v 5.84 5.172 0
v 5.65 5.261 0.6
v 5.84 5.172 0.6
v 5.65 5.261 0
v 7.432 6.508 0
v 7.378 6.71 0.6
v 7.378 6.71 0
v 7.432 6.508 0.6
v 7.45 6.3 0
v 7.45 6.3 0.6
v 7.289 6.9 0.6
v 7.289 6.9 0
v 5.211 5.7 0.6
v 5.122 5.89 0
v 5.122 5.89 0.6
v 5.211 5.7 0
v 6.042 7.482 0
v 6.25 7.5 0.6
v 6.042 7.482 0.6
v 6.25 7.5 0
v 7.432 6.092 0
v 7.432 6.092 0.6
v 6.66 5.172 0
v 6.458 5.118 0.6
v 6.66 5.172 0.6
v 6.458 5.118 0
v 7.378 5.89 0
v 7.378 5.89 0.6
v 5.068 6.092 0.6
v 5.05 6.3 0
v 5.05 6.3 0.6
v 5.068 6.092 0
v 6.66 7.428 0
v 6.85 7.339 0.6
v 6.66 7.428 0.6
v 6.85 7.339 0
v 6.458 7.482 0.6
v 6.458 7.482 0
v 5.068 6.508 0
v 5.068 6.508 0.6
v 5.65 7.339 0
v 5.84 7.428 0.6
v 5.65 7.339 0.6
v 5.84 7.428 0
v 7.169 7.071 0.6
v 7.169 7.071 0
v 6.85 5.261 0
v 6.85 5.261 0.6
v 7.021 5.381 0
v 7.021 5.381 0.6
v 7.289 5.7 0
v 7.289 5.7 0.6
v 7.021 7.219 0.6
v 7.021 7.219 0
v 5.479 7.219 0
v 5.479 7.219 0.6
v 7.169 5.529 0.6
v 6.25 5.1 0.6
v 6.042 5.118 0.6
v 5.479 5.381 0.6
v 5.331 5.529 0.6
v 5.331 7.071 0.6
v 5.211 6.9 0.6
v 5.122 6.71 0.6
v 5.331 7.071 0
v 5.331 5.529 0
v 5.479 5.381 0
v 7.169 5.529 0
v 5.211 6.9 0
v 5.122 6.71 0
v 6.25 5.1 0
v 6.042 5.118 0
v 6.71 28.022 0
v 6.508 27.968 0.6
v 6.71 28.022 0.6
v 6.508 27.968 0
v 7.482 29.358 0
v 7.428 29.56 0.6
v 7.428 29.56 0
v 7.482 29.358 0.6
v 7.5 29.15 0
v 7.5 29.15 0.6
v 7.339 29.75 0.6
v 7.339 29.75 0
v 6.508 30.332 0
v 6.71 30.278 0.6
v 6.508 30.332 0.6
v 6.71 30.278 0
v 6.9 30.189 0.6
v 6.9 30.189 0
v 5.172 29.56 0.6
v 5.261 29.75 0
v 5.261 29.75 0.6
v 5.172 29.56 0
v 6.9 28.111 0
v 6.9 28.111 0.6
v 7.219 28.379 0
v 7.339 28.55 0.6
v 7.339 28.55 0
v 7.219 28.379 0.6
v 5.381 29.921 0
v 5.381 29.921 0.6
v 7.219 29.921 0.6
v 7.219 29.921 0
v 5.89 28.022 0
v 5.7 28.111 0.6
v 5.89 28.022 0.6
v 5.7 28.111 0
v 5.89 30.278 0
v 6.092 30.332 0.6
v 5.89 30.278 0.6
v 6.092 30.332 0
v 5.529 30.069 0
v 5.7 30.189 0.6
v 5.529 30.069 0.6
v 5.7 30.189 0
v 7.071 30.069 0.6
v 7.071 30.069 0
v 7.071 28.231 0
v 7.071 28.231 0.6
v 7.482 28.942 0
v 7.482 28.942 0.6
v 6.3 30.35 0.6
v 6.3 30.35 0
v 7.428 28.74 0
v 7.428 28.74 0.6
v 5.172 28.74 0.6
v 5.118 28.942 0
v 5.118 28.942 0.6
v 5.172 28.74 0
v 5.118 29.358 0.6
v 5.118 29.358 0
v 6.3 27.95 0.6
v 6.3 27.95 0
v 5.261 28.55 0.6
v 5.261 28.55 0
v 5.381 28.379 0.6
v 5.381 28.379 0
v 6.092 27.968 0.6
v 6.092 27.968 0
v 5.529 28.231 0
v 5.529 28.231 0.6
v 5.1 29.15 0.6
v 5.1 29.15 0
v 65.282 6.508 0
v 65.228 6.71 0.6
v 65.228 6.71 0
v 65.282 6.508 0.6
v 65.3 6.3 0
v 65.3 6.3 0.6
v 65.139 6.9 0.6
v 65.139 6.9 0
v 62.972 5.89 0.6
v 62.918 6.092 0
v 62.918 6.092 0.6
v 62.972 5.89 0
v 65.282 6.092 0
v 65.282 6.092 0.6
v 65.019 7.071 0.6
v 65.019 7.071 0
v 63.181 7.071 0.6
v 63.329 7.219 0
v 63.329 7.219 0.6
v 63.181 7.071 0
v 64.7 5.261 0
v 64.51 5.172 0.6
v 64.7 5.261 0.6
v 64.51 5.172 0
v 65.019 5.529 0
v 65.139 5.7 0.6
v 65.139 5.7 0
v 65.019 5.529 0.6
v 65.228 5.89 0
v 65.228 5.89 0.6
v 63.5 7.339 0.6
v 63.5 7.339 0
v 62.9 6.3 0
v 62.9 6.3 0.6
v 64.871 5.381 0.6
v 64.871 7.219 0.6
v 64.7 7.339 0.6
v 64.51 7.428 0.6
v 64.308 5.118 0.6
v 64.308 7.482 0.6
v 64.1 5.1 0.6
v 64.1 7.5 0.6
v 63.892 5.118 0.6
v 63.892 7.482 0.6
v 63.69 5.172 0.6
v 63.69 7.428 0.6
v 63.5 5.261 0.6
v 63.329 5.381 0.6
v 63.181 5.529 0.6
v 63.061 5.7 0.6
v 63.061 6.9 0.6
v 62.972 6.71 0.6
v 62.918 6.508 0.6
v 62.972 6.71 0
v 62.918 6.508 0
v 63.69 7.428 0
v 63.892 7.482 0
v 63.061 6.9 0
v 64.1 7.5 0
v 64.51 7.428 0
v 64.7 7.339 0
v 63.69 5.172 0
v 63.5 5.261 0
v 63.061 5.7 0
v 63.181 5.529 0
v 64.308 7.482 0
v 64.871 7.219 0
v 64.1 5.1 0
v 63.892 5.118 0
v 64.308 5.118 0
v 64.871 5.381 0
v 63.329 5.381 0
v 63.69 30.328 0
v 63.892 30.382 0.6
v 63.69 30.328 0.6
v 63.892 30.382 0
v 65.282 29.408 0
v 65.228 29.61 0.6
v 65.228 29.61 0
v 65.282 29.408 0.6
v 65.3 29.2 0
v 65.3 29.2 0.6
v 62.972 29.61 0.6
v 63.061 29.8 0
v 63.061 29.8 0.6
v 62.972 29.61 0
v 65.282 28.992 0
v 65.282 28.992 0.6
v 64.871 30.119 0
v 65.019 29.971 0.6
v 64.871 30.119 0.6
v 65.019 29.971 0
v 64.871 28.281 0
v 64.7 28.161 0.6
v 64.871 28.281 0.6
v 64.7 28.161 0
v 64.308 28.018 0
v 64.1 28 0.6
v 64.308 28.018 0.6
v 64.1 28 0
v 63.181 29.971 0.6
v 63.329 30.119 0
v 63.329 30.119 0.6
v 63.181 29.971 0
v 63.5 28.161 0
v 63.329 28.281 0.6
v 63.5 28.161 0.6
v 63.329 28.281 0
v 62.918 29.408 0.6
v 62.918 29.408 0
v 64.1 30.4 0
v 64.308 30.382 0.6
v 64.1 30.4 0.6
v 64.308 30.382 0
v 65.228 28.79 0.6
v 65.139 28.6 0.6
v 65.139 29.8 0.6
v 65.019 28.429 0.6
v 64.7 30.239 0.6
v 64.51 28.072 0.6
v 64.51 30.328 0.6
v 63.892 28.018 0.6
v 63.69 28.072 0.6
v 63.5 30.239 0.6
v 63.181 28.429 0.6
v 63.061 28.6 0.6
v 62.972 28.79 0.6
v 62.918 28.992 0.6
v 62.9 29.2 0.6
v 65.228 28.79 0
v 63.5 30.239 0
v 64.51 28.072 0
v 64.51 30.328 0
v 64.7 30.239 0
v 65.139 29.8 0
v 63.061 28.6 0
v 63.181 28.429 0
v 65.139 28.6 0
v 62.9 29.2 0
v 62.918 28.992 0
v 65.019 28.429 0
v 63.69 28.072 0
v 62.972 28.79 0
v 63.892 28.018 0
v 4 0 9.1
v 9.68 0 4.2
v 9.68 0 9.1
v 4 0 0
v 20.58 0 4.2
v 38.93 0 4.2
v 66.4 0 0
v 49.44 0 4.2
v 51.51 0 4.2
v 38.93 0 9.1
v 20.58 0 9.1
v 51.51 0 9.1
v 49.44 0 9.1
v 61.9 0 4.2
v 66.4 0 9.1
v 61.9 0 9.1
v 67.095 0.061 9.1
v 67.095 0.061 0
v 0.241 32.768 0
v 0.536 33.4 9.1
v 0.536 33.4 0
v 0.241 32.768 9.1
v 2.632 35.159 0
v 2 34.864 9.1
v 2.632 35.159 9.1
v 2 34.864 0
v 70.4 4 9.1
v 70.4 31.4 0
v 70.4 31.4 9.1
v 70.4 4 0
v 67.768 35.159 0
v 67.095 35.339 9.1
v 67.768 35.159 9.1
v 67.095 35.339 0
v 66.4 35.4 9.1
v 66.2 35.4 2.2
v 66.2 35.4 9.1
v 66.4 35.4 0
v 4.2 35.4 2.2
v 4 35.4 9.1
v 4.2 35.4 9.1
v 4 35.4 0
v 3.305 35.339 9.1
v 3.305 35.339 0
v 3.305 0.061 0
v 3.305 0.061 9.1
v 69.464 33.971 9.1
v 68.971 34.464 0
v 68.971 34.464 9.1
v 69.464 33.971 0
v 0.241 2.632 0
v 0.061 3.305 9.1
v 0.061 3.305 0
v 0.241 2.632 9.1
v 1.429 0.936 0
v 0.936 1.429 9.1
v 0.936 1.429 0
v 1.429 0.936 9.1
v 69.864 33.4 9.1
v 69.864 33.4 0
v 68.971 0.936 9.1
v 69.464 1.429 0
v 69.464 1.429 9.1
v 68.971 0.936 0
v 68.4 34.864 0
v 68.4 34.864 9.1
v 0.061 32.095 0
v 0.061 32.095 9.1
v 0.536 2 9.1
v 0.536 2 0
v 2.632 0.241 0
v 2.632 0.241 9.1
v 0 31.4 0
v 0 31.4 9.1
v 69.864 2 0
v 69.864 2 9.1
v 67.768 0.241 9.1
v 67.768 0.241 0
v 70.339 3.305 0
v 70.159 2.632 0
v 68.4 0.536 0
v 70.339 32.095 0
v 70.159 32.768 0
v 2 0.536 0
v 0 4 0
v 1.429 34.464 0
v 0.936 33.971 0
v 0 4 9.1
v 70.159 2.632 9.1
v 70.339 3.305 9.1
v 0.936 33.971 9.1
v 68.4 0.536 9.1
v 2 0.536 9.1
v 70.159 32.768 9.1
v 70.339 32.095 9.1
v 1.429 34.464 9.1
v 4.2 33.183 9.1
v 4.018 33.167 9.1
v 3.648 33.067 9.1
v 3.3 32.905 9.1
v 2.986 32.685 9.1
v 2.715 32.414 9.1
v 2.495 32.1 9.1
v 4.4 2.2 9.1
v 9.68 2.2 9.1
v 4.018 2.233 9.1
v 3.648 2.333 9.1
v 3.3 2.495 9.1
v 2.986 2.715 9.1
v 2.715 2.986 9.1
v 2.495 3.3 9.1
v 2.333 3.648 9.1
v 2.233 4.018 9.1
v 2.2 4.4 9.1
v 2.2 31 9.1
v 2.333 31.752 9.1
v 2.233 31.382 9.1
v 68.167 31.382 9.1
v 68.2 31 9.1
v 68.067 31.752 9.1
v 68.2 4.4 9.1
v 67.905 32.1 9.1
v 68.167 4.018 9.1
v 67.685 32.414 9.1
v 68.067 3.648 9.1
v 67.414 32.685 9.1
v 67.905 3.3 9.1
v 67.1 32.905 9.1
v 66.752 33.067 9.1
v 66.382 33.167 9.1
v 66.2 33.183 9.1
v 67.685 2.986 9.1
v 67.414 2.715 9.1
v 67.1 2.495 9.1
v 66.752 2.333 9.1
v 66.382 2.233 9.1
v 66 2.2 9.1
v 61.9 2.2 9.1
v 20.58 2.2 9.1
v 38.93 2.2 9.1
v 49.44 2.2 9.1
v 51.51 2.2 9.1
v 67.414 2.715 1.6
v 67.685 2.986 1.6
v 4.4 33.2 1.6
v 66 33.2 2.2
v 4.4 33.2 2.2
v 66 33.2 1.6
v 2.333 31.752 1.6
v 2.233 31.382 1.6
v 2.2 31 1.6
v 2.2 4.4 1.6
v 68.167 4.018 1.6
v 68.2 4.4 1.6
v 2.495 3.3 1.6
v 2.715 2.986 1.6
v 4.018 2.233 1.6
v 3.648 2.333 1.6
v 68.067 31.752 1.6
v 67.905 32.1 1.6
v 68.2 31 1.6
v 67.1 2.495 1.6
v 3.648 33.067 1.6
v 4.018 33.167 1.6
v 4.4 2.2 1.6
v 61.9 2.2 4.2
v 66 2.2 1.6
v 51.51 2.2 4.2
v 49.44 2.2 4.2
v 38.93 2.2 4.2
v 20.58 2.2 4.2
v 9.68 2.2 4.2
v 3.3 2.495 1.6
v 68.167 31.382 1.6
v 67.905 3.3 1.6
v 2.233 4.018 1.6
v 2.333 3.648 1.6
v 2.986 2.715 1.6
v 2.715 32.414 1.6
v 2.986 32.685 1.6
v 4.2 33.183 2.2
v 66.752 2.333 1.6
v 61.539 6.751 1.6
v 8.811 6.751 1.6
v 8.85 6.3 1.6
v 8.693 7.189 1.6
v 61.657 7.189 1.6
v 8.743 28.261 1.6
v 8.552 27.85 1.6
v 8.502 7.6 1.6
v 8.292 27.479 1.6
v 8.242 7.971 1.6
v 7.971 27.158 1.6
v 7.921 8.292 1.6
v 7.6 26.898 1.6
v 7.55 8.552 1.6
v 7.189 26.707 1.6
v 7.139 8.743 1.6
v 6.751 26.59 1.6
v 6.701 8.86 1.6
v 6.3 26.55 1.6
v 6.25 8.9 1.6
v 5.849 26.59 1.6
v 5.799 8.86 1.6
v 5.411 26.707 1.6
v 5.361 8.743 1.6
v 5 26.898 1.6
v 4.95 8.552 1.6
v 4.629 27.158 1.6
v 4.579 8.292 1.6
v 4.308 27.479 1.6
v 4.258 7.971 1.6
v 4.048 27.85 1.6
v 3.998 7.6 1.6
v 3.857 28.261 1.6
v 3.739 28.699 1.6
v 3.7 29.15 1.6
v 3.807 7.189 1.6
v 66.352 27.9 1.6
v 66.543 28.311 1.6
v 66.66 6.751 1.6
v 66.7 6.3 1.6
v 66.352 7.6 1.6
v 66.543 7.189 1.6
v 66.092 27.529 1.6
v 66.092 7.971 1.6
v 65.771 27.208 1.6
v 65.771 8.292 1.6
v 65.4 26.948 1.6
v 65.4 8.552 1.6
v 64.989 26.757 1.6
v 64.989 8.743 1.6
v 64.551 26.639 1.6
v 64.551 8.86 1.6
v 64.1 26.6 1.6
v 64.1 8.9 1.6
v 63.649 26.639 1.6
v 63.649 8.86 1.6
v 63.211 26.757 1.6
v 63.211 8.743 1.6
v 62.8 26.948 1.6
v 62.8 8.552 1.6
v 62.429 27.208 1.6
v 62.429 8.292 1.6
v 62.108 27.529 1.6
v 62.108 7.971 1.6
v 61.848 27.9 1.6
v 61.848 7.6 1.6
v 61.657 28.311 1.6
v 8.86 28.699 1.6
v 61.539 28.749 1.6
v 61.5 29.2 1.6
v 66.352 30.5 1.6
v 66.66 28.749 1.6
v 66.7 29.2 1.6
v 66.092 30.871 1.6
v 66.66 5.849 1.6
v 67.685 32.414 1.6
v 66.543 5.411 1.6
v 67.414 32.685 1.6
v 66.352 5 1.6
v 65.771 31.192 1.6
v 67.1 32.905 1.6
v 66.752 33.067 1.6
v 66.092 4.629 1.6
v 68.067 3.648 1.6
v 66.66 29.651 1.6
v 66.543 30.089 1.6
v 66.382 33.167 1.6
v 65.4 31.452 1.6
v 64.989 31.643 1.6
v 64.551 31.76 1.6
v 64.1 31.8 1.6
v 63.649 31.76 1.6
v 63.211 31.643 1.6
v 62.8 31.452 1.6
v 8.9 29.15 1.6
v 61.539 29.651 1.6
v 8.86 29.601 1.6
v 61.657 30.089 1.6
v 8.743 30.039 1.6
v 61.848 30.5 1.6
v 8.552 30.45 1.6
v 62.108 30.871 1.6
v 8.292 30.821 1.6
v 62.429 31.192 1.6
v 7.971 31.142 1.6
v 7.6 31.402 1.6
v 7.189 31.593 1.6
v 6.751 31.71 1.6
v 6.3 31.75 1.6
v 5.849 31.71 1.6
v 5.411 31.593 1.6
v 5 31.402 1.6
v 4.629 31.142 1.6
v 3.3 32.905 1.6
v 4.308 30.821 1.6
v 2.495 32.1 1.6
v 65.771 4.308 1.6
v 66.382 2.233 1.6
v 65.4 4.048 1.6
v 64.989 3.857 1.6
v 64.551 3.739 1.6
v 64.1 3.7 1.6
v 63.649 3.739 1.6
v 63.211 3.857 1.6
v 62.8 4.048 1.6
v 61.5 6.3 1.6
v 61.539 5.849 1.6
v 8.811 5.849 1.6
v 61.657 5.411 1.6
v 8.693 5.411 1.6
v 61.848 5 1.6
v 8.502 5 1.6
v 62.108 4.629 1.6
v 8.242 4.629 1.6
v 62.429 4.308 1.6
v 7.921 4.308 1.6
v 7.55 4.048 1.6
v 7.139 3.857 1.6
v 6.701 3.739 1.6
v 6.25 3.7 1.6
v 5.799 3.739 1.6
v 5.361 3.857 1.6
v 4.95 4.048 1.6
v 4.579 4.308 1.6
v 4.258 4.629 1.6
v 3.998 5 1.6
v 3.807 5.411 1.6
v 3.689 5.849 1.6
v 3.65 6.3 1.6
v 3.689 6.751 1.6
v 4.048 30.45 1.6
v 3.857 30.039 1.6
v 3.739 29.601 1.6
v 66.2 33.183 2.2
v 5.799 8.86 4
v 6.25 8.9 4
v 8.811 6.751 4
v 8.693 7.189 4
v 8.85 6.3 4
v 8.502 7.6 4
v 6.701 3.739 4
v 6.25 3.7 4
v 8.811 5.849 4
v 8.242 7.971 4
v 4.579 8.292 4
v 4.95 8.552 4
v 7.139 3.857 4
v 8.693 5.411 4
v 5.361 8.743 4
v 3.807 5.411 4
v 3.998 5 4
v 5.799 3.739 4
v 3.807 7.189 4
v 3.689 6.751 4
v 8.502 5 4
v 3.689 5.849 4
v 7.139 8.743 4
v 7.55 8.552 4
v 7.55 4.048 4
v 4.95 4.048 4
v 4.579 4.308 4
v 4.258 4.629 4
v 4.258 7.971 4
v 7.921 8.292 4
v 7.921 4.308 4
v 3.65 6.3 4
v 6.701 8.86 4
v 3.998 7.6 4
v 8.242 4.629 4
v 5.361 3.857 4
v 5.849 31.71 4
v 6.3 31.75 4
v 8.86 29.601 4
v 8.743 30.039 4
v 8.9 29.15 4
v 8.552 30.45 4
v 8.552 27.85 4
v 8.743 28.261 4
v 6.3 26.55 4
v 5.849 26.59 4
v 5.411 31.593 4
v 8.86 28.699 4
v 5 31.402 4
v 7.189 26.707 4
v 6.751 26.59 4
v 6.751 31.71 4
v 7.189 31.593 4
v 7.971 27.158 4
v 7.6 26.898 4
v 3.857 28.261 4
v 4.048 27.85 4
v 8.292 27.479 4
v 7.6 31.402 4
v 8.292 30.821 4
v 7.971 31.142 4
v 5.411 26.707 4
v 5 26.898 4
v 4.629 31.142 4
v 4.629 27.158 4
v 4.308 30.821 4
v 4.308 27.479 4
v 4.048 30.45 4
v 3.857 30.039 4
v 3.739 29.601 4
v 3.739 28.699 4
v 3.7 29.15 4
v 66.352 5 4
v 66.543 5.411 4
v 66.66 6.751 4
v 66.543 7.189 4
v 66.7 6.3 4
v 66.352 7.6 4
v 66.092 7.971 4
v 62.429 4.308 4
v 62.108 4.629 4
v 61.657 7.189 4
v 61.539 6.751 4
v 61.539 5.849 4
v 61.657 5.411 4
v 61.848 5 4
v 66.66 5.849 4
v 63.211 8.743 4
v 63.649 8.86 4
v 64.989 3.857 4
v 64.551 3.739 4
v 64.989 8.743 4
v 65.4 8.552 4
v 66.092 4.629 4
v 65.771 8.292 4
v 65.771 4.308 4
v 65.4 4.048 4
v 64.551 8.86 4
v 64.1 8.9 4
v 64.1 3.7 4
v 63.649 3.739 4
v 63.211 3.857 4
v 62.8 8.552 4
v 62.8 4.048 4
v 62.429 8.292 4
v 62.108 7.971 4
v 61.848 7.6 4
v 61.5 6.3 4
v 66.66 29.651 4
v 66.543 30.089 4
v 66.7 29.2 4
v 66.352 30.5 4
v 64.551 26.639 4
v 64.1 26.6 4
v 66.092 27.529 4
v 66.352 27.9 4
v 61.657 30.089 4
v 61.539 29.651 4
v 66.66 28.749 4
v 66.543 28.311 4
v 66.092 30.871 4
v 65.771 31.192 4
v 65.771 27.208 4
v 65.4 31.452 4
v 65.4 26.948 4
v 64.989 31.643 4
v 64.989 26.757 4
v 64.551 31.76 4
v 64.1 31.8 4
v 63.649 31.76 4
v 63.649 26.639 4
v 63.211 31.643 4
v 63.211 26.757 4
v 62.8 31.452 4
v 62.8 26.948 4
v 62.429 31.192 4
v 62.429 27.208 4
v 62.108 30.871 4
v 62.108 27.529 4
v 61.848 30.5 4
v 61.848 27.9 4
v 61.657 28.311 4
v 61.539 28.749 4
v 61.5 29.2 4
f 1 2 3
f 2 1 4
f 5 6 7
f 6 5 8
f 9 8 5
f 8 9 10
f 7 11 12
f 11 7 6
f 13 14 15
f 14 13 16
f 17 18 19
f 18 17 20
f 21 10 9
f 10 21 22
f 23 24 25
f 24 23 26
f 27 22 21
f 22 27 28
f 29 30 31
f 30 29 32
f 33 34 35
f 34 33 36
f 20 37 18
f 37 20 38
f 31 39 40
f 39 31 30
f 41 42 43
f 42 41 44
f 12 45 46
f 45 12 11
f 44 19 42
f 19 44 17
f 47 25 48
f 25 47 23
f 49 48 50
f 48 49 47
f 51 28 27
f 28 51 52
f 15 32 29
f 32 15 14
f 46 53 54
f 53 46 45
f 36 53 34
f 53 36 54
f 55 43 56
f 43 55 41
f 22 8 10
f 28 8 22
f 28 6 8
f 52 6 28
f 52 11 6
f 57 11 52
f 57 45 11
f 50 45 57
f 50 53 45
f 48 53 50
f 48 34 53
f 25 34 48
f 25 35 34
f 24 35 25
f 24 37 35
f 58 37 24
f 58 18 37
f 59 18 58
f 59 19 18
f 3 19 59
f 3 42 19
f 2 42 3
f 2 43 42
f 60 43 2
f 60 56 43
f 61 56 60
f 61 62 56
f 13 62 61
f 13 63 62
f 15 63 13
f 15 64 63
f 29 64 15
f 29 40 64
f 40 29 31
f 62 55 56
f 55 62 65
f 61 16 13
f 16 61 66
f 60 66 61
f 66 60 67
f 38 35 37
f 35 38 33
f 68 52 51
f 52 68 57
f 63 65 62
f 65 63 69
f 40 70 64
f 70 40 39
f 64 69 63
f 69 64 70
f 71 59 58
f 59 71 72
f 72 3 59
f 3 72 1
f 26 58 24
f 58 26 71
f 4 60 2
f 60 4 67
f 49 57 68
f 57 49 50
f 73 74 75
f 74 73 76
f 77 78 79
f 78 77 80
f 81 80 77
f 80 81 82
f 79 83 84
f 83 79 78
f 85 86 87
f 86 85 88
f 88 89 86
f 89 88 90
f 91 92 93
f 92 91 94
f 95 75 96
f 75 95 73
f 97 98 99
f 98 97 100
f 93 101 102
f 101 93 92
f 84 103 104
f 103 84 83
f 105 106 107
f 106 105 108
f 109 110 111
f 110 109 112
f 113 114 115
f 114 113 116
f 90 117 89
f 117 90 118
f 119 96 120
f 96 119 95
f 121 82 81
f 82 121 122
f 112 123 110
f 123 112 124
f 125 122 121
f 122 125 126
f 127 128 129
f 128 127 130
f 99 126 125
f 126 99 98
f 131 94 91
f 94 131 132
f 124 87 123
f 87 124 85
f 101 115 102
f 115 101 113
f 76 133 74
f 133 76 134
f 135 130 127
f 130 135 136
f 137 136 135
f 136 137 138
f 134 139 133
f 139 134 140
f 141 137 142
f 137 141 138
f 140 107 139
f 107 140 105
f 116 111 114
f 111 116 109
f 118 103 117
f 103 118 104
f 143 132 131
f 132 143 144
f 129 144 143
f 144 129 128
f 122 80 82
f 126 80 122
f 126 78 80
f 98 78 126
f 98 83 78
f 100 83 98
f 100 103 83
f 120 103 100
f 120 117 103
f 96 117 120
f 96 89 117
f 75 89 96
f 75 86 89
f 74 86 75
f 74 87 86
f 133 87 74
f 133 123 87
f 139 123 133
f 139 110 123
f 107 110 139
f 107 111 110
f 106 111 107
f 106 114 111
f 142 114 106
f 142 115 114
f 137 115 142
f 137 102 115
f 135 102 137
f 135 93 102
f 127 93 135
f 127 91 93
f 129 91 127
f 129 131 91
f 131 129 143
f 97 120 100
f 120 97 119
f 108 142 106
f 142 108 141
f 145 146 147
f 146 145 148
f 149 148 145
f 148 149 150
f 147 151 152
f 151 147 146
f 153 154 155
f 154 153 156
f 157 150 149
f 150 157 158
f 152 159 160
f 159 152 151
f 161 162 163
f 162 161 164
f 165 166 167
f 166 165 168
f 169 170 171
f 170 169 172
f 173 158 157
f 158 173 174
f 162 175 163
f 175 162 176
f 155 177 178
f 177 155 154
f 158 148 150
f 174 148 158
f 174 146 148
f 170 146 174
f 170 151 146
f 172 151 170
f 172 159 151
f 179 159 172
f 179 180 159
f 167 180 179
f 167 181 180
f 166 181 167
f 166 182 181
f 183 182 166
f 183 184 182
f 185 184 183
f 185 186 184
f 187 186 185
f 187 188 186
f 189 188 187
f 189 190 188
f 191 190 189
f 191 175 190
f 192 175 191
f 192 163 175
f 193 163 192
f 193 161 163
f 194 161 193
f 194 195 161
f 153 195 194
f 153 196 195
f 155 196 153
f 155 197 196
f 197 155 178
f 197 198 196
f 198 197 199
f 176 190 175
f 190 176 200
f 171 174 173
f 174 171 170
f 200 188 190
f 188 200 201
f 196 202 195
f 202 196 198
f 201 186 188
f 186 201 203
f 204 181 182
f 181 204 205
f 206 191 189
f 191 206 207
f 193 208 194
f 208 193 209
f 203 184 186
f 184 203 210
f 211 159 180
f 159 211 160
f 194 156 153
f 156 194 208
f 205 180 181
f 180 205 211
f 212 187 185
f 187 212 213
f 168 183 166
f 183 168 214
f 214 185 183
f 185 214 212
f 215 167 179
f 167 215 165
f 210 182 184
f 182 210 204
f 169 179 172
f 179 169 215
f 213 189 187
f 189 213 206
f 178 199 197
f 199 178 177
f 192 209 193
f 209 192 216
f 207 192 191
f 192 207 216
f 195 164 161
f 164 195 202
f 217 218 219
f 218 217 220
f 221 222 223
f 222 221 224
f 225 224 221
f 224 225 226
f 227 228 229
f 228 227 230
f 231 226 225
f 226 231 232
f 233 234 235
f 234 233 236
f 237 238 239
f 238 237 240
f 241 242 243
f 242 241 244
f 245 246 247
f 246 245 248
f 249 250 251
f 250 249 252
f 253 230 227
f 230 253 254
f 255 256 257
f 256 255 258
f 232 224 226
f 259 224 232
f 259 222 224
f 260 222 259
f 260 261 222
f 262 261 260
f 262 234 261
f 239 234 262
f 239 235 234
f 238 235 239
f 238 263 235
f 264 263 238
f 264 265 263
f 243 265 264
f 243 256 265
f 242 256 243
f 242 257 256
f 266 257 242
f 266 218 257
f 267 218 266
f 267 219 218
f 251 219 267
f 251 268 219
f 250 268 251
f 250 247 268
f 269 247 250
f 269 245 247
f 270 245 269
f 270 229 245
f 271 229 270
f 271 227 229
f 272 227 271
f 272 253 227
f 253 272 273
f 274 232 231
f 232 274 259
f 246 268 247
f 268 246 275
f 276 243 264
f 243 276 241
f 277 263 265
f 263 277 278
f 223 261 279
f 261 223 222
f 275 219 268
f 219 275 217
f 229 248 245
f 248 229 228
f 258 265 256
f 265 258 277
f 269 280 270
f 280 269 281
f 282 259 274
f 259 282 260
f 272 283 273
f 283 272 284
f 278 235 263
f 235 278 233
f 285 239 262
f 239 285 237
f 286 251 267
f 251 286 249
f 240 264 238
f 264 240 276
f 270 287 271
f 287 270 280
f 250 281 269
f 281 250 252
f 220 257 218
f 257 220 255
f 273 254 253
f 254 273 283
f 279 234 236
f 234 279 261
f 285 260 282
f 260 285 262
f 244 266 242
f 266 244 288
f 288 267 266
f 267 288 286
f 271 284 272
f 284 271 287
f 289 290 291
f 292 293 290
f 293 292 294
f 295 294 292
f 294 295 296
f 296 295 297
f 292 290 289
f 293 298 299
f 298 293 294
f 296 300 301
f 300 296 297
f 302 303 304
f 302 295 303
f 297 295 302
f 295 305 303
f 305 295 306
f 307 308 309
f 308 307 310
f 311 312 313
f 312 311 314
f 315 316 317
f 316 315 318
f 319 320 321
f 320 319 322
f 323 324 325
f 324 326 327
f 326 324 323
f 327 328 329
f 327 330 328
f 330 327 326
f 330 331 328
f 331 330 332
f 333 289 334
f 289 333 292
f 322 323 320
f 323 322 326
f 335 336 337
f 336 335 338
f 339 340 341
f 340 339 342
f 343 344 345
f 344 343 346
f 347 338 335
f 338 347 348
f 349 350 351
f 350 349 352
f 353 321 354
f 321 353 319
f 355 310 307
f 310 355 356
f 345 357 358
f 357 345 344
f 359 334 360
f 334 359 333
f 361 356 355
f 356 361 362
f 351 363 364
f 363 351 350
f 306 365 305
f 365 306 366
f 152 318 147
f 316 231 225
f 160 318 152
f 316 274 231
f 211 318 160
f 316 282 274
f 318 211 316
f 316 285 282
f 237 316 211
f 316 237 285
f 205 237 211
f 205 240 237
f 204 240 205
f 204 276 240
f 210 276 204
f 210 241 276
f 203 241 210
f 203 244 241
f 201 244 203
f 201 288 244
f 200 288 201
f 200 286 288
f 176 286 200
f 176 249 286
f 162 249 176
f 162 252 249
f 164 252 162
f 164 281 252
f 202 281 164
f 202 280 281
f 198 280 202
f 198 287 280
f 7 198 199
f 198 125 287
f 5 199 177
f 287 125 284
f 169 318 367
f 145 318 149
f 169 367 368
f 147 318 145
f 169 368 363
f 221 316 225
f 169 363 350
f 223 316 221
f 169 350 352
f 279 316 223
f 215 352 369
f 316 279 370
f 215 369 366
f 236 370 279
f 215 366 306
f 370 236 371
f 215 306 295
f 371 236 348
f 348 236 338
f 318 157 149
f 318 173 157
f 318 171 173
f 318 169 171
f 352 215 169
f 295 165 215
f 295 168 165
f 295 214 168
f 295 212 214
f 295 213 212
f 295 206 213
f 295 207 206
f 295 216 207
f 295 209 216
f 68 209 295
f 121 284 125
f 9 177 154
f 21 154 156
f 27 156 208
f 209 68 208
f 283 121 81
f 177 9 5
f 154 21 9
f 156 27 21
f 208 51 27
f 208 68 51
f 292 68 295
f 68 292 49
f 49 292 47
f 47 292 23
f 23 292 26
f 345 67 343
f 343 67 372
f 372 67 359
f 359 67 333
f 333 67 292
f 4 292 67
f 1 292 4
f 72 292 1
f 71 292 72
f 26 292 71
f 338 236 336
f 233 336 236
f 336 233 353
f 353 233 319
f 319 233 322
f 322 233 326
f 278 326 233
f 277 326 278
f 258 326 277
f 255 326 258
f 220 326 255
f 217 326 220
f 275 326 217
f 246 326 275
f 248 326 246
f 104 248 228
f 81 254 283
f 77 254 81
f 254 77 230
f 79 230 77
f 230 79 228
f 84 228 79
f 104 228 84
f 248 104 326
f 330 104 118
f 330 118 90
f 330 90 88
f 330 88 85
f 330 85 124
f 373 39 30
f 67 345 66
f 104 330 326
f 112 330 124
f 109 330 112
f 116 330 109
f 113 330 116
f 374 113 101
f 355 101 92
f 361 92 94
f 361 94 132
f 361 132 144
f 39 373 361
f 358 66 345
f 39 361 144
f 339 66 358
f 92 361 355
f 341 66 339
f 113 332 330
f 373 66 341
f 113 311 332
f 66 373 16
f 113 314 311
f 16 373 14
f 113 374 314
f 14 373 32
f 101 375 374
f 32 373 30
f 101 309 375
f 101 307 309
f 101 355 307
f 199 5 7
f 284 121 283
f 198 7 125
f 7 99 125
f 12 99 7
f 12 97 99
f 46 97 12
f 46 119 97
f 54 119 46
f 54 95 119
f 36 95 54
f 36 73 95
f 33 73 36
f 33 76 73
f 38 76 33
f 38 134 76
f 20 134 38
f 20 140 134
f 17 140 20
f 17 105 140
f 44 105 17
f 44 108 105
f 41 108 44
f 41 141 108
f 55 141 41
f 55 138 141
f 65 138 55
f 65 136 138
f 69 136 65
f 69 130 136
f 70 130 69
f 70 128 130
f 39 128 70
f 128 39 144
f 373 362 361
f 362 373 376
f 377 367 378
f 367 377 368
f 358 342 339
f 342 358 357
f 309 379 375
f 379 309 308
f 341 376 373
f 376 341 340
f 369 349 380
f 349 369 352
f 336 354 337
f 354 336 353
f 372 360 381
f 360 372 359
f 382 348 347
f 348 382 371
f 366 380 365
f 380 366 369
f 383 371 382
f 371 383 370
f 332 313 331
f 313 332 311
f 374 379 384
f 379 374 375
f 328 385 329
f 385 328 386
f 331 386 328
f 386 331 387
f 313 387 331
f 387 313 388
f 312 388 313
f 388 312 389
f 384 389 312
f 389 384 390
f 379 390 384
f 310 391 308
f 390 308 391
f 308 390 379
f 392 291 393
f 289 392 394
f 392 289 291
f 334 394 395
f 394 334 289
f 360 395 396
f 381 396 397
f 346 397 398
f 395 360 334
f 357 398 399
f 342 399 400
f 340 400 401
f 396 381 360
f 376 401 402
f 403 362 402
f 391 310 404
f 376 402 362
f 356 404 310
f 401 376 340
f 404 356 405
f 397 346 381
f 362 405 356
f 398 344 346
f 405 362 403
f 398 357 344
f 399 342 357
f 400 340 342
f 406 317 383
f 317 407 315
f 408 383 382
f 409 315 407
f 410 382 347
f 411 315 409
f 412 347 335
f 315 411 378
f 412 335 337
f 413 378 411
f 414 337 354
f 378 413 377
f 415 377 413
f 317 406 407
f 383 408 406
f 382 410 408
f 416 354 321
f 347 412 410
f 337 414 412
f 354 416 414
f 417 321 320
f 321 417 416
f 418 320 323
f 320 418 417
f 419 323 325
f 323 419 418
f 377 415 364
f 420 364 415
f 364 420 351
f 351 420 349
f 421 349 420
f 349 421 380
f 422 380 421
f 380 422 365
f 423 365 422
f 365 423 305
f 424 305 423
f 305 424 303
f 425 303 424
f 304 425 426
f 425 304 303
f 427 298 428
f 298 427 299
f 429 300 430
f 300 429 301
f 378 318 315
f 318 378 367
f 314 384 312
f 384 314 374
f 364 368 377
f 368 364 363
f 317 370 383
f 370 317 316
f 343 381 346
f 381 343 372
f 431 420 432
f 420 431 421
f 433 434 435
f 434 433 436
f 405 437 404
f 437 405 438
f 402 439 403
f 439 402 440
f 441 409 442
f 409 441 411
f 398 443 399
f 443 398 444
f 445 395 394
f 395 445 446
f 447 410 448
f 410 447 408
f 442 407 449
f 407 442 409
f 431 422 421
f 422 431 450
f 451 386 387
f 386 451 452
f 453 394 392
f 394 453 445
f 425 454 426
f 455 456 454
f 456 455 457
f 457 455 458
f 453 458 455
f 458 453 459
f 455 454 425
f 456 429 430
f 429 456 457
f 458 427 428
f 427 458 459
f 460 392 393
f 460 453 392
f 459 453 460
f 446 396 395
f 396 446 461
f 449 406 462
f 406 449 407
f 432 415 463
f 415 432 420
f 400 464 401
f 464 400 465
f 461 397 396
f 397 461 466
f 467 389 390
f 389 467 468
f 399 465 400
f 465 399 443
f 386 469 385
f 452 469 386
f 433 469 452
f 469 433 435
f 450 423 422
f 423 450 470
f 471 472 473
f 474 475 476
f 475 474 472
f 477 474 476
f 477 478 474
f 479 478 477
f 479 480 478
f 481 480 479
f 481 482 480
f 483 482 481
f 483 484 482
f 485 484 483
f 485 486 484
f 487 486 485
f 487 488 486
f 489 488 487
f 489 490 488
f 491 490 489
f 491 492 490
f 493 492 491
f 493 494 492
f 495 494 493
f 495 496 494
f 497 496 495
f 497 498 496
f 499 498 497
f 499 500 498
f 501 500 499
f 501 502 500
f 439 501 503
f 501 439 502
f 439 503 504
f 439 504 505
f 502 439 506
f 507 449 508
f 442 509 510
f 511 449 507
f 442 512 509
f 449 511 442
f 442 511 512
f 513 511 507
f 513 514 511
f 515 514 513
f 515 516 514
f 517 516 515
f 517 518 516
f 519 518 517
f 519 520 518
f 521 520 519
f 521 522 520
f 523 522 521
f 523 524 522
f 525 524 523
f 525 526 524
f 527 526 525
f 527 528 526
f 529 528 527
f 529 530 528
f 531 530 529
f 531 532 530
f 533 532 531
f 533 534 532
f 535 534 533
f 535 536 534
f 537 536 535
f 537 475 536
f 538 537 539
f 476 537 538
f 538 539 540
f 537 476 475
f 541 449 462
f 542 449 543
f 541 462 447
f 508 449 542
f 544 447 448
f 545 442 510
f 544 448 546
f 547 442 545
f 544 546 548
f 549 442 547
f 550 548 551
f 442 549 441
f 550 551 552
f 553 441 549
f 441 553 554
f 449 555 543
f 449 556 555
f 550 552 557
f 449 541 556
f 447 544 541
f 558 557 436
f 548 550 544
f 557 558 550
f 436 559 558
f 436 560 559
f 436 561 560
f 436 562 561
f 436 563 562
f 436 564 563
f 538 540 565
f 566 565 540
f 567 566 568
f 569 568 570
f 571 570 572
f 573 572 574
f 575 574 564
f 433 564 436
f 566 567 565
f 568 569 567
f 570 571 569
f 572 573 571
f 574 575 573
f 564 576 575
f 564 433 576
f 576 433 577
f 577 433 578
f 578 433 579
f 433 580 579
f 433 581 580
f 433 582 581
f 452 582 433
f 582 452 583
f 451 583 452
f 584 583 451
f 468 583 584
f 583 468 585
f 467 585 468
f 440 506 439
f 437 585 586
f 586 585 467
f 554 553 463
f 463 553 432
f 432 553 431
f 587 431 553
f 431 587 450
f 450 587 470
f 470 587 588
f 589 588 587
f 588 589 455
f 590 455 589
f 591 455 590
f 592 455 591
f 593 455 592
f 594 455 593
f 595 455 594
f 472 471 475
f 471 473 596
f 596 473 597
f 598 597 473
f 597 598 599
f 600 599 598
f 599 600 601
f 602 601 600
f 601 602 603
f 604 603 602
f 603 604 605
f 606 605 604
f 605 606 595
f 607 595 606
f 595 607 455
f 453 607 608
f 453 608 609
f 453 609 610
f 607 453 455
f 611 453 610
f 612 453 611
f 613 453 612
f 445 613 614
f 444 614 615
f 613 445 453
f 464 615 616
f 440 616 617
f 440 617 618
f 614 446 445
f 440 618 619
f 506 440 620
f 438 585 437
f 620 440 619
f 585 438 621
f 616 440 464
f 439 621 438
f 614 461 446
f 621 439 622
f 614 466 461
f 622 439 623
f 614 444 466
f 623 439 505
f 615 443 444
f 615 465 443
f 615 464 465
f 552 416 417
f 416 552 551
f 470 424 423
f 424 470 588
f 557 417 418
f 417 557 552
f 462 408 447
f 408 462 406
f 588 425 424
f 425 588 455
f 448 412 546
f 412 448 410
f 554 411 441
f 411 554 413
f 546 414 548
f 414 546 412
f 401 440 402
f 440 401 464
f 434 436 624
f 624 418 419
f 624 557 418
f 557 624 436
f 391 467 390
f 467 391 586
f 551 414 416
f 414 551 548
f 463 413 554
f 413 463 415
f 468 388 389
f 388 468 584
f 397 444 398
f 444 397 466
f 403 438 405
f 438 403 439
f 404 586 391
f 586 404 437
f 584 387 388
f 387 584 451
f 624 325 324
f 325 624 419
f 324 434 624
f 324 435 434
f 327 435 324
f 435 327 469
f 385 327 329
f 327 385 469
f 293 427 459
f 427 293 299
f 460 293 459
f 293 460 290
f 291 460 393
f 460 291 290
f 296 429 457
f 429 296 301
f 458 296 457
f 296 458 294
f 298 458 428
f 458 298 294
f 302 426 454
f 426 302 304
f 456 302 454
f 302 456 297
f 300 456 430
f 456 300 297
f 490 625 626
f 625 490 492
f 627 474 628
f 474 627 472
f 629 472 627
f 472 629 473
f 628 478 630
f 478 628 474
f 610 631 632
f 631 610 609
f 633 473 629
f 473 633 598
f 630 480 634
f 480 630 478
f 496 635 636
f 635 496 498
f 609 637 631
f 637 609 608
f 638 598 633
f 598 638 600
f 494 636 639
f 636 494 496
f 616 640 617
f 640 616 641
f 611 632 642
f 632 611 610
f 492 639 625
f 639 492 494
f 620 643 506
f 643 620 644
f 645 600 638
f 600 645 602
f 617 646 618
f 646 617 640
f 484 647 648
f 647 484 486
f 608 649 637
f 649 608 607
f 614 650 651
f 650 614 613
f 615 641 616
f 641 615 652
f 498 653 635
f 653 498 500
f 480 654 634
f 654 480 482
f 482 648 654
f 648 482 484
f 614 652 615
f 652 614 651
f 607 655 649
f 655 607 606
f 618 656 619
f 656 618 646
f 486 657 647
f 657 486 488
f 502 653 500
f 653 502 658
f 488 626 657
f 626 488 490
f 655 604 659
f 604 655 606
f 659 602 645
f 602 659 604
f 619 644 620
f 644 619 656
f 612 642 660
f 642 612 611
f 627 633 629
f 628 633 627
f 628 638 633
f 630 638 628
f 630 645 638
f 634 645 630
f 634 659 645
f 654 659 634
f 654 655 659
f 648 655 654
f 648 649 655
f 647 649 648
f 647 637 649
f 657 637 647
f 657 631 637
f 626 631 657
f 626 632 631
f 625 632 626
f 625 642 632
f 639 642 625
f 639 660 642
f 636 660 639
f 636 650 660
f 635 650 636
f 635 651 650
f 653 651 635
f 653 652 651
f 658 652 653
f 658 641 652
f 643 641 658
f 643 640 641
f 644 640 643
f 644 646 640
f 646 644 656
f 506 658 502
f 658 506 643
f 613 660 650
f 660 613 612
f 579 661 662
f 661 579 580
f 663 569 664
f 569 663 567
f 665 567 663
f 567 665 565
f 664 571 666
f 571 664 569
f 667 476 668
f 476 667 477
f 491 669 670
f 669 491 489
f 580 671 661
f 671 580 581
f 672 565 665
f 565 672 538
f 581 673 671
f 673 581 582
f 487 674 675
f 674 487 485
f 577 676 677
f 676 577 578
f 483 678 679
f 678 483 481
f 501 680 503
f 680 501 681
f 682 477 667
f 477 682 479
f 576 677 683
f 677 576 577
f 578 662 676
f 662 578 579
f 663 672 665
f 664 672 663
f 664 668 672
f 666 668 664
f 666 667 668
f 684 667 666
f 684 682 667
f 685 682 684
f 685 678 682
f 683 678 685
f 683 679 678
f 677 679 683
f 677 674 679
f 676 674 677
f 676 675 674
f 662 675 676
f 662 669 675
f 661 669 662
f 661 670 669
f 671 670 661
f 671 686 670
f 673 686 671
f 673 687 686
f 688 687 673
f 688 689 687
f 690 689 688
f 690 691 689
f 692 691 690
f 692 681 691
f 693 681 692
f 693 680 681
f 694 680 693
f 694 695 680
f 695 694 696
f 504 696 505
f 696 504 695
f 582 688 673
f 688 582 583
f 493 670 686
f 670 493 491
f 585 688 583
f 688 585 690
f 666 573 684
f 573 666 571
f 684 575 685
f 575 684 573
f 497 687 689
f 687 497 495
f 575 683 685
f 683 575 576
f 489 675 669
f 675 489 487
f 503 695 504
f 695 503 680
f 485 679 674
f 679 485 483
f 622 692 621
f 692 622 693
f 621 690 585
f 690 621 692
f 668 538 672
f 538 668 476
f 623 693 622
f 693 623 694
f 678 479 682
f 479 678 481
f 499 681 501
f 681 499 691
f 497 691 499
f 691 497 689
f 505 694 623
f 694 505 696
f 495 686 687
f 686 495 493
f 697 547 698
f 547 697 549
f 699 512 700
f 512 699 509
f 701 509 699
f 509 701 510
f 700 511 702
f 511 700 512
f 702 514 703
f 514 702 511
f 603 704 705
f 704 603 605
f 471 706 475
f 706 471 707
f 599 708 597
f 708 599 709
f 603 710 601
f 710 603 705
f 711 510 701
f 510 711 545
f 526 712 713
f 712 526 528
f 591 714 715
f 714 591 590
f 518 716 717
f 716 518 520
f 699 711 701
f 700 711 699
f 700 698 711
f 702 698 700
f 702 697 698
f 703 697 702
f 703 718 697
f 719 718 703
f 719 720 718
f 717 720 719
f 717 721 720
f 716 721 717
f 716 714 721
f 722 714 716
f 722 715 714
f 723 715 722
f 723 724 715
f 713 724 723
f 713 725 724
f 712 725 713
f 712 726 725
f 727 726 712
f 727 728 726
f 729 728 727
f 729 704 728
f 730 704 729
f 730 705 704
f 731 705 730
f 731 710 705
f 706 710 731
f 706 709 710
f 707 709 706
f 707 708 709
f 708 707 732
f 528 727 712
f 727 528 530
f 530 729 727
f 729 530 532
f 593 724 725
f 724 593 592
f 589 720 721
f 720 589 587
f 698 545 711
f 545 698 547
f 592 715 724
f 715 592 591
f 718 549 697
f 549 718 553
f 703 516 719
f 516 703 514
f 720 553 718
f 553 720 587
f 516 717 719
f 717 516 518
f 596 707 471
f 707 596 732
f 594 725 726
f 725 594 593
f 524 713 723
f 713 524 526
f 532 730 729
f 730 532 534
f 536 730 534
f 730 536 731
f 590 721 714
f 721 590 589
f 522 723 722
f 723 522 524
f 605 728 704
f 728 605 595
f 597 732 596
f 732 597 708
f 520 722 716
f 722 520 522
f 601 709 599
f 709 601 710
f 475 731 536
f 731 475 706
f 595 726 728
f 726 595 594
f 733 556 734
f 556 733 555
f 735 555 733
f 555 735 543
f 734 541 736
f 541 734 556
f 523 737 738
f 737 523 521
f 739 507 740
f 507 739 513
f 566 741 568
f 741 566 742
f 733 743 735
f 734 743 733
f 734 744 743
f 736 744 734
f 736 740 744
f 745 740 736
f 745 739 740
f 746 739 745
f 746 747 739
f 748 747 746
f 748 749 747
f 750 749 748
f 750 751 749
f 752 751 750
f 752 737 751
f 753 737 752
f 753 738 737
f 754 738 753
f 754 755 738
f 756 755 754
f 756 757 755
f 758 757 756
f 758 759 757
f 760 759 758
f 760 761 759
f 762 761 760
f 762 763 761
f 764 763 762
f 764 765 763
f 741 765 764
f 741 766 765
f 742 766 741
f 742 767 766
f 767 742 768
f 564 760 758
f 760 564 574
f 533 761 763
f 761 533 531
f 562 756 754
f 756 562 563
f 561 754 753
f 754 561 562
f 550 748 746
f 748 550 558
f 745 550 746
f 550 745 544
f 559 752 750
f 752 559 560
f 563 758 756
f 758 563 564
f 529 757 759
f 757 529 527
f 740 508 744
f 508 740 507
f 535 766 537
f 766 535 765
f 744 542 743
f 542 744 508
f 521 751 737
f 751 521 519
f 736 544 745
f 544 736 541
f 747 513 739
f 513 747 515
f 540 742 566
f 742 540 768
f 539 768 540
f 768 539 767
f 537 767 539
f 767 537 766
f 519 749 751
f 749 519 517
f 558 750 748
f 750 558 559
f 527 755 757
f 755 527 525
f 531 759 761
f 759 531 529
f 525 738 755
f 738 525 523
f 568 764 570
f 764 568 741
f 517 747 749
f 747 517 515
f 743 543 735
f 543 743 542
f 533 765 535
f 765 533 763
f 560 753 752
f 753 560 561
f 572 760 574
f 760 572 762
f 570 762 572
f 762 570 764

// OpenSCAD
// file: zero3w_board.scad
// Shared Radxa ZERO 3W mechanicals from official v1.11 DXF.
// Origin: HDMI/CSI corner. GPIO along y=30. Ports along y=0.
//
// Filament on the shelf (2026-08-12): 2× black PLA, 2× white PLA.
// Ender-3 V3 SE is a single extruder — one color per print job.
// Two-tone Hive = black base + white lid as two separate slices, then snap.
pla_black = [0.10, 0.10, 0.11];
pla_white = [0.95, 0.95, 0.93];

board_x = 65.0;
board_y = 30.0;
pcb_t   = 1.2;

hole_xy = [
    [ 3.55,  3.60],
    [ 3.60, 26.45],
    [61.40,  3.60],
    [61.40, 26.50]
];

hdmi_x0 =  9.18; hdmi_x1 = 15.68;
usb3_x0 = 36.93; usb3_x1 = 46.04;
otg_x0  = 49.51; otg_x1  = 58.50;

hdmi_cx = (hdmi_x0 + hdmi_x1) / 2;
usb3_cx = (usb3_x0 + usb3_x1) / 2;
otg_cx  = (otg_x0  + otg_x1)  / 2;

gpio_x0 = 7.05;  gpio_x1 = 57.85;
gpio_y0 = 24.14; gpio_y1 = 29.22;

csi_cy = 15.03; csi_len = 17.5;
sd_cy  = 15.00; sd_len  = 12.8;

maskrom_xy = [21.84, 2.20];
ufl_xy     = [63.50, 19.685];

// HDMI on this board is micro (Type D). Metal in the DXF is 6.50 mm.
// The hole has to pass the *cable overmold*, which is ~11 mm wide on a
// typical Type-D lead — that is why this opening is close to USB-C size.
hdmi_housing_extra = 3.0;
function hdmi_cut_w(clear) = (hdmi_x1 - hdmi_x0) + 2 * clear + hdmi_housing_extra;
function usb3_cut_w(clear) = (usb3_x1 - usb3_x0) + 2 * clear;
function otg_cut_w(clear)  = (otg_x1  - otg_x0)  + 2 * clear;
hdmi_above = 6.6;   // mm above PCB top — overmold, not the 2.8 mm metal
usb_above  = 6.6;
// main file
// 15-minute first print for the Ender 3 V3 SE.
// Open tray: drop the real ZERO 3W in and try the three cables.
// If the plugs line up, print the Hive case. If they don't, stop and
// change port_clear / centers in zero3w_board.scad.

include <zero3w_board.scad>

xy_clear   = 0.5;
port_clear = 0.7;
wall       = 2.2;
floor_t    = 1.6;
under      = 2.4;
tall       = under + pcb_t + 5.5;

$fn = 36;

ix = board_x + 2 * xy_clear;
iy = board_y + 2 * xy_clear;
ox = ix + 2 * wall;
oy = iy + 2 * wall;

function bx(x) = wall + xy_clear + x;
function by(y) = wall + xy_clear + y;

module rounded_cube(size, r) {
    x = size[0]; y = size[1]; z = size[2];
    rr = min(r, x / 2 - 0.05, y / 2 - 0.05);
    hull()
        for (px = [rr, x - rr], py = [rr, y - rr])
            translate([px, py, 0])
                cylinder(h = z, r = rr);
}

z_top = floor_t + under + pcb_t;
usb3_w = usb3_cut_w(port_clear);
otg_w  = otg_cut_w(port_clear);
hdmi_w = hdmi_cut_w(port_clear);

// White PLA — first fit print, one color, one job.
color(pla_white) {
    difference() {
        rounded_cube([ox, oy, tall], 4.0);
        translate([wall, wall, floor_t])
            rounded_cube([ix, iy, tall], 2.2);
        // open the GPIO side so you can lift the board out
        translate([wall + 2, oy - wall - 0.1, floor_t + 0.6])
            cube([ix - 4, wall + 1, tall]);
        translate([bx(hdmi_cx) - hdmi_w / 2, -0.2, z_top - 1.0])
            cube([hdmi_w, wall + 2, hdmi_above + 1.0]);
        translate([bx(usb3_cx) - usb3_w / 2, -0.2, z_top - 1.0])
            cube([usb3_w, wall + 2, usb_above + 1.0]);
        translate([bx(otg_cx) - otg_w / 2, -0.2, z_top - 1.0])
            cube([otg_w, wall + 2, usb_above + 1.0]);
        for (p = hole_xy)
            translate([bx(p[0]), by(p[1]), -0.1])
                cylinder(h = 0.7, d = 2.4);
    }

    for (p = hole_xy)
        translate([bx(p[0]), by(p[1]), floor_t])
            cylinder(h = under, d = 5.2);
}
